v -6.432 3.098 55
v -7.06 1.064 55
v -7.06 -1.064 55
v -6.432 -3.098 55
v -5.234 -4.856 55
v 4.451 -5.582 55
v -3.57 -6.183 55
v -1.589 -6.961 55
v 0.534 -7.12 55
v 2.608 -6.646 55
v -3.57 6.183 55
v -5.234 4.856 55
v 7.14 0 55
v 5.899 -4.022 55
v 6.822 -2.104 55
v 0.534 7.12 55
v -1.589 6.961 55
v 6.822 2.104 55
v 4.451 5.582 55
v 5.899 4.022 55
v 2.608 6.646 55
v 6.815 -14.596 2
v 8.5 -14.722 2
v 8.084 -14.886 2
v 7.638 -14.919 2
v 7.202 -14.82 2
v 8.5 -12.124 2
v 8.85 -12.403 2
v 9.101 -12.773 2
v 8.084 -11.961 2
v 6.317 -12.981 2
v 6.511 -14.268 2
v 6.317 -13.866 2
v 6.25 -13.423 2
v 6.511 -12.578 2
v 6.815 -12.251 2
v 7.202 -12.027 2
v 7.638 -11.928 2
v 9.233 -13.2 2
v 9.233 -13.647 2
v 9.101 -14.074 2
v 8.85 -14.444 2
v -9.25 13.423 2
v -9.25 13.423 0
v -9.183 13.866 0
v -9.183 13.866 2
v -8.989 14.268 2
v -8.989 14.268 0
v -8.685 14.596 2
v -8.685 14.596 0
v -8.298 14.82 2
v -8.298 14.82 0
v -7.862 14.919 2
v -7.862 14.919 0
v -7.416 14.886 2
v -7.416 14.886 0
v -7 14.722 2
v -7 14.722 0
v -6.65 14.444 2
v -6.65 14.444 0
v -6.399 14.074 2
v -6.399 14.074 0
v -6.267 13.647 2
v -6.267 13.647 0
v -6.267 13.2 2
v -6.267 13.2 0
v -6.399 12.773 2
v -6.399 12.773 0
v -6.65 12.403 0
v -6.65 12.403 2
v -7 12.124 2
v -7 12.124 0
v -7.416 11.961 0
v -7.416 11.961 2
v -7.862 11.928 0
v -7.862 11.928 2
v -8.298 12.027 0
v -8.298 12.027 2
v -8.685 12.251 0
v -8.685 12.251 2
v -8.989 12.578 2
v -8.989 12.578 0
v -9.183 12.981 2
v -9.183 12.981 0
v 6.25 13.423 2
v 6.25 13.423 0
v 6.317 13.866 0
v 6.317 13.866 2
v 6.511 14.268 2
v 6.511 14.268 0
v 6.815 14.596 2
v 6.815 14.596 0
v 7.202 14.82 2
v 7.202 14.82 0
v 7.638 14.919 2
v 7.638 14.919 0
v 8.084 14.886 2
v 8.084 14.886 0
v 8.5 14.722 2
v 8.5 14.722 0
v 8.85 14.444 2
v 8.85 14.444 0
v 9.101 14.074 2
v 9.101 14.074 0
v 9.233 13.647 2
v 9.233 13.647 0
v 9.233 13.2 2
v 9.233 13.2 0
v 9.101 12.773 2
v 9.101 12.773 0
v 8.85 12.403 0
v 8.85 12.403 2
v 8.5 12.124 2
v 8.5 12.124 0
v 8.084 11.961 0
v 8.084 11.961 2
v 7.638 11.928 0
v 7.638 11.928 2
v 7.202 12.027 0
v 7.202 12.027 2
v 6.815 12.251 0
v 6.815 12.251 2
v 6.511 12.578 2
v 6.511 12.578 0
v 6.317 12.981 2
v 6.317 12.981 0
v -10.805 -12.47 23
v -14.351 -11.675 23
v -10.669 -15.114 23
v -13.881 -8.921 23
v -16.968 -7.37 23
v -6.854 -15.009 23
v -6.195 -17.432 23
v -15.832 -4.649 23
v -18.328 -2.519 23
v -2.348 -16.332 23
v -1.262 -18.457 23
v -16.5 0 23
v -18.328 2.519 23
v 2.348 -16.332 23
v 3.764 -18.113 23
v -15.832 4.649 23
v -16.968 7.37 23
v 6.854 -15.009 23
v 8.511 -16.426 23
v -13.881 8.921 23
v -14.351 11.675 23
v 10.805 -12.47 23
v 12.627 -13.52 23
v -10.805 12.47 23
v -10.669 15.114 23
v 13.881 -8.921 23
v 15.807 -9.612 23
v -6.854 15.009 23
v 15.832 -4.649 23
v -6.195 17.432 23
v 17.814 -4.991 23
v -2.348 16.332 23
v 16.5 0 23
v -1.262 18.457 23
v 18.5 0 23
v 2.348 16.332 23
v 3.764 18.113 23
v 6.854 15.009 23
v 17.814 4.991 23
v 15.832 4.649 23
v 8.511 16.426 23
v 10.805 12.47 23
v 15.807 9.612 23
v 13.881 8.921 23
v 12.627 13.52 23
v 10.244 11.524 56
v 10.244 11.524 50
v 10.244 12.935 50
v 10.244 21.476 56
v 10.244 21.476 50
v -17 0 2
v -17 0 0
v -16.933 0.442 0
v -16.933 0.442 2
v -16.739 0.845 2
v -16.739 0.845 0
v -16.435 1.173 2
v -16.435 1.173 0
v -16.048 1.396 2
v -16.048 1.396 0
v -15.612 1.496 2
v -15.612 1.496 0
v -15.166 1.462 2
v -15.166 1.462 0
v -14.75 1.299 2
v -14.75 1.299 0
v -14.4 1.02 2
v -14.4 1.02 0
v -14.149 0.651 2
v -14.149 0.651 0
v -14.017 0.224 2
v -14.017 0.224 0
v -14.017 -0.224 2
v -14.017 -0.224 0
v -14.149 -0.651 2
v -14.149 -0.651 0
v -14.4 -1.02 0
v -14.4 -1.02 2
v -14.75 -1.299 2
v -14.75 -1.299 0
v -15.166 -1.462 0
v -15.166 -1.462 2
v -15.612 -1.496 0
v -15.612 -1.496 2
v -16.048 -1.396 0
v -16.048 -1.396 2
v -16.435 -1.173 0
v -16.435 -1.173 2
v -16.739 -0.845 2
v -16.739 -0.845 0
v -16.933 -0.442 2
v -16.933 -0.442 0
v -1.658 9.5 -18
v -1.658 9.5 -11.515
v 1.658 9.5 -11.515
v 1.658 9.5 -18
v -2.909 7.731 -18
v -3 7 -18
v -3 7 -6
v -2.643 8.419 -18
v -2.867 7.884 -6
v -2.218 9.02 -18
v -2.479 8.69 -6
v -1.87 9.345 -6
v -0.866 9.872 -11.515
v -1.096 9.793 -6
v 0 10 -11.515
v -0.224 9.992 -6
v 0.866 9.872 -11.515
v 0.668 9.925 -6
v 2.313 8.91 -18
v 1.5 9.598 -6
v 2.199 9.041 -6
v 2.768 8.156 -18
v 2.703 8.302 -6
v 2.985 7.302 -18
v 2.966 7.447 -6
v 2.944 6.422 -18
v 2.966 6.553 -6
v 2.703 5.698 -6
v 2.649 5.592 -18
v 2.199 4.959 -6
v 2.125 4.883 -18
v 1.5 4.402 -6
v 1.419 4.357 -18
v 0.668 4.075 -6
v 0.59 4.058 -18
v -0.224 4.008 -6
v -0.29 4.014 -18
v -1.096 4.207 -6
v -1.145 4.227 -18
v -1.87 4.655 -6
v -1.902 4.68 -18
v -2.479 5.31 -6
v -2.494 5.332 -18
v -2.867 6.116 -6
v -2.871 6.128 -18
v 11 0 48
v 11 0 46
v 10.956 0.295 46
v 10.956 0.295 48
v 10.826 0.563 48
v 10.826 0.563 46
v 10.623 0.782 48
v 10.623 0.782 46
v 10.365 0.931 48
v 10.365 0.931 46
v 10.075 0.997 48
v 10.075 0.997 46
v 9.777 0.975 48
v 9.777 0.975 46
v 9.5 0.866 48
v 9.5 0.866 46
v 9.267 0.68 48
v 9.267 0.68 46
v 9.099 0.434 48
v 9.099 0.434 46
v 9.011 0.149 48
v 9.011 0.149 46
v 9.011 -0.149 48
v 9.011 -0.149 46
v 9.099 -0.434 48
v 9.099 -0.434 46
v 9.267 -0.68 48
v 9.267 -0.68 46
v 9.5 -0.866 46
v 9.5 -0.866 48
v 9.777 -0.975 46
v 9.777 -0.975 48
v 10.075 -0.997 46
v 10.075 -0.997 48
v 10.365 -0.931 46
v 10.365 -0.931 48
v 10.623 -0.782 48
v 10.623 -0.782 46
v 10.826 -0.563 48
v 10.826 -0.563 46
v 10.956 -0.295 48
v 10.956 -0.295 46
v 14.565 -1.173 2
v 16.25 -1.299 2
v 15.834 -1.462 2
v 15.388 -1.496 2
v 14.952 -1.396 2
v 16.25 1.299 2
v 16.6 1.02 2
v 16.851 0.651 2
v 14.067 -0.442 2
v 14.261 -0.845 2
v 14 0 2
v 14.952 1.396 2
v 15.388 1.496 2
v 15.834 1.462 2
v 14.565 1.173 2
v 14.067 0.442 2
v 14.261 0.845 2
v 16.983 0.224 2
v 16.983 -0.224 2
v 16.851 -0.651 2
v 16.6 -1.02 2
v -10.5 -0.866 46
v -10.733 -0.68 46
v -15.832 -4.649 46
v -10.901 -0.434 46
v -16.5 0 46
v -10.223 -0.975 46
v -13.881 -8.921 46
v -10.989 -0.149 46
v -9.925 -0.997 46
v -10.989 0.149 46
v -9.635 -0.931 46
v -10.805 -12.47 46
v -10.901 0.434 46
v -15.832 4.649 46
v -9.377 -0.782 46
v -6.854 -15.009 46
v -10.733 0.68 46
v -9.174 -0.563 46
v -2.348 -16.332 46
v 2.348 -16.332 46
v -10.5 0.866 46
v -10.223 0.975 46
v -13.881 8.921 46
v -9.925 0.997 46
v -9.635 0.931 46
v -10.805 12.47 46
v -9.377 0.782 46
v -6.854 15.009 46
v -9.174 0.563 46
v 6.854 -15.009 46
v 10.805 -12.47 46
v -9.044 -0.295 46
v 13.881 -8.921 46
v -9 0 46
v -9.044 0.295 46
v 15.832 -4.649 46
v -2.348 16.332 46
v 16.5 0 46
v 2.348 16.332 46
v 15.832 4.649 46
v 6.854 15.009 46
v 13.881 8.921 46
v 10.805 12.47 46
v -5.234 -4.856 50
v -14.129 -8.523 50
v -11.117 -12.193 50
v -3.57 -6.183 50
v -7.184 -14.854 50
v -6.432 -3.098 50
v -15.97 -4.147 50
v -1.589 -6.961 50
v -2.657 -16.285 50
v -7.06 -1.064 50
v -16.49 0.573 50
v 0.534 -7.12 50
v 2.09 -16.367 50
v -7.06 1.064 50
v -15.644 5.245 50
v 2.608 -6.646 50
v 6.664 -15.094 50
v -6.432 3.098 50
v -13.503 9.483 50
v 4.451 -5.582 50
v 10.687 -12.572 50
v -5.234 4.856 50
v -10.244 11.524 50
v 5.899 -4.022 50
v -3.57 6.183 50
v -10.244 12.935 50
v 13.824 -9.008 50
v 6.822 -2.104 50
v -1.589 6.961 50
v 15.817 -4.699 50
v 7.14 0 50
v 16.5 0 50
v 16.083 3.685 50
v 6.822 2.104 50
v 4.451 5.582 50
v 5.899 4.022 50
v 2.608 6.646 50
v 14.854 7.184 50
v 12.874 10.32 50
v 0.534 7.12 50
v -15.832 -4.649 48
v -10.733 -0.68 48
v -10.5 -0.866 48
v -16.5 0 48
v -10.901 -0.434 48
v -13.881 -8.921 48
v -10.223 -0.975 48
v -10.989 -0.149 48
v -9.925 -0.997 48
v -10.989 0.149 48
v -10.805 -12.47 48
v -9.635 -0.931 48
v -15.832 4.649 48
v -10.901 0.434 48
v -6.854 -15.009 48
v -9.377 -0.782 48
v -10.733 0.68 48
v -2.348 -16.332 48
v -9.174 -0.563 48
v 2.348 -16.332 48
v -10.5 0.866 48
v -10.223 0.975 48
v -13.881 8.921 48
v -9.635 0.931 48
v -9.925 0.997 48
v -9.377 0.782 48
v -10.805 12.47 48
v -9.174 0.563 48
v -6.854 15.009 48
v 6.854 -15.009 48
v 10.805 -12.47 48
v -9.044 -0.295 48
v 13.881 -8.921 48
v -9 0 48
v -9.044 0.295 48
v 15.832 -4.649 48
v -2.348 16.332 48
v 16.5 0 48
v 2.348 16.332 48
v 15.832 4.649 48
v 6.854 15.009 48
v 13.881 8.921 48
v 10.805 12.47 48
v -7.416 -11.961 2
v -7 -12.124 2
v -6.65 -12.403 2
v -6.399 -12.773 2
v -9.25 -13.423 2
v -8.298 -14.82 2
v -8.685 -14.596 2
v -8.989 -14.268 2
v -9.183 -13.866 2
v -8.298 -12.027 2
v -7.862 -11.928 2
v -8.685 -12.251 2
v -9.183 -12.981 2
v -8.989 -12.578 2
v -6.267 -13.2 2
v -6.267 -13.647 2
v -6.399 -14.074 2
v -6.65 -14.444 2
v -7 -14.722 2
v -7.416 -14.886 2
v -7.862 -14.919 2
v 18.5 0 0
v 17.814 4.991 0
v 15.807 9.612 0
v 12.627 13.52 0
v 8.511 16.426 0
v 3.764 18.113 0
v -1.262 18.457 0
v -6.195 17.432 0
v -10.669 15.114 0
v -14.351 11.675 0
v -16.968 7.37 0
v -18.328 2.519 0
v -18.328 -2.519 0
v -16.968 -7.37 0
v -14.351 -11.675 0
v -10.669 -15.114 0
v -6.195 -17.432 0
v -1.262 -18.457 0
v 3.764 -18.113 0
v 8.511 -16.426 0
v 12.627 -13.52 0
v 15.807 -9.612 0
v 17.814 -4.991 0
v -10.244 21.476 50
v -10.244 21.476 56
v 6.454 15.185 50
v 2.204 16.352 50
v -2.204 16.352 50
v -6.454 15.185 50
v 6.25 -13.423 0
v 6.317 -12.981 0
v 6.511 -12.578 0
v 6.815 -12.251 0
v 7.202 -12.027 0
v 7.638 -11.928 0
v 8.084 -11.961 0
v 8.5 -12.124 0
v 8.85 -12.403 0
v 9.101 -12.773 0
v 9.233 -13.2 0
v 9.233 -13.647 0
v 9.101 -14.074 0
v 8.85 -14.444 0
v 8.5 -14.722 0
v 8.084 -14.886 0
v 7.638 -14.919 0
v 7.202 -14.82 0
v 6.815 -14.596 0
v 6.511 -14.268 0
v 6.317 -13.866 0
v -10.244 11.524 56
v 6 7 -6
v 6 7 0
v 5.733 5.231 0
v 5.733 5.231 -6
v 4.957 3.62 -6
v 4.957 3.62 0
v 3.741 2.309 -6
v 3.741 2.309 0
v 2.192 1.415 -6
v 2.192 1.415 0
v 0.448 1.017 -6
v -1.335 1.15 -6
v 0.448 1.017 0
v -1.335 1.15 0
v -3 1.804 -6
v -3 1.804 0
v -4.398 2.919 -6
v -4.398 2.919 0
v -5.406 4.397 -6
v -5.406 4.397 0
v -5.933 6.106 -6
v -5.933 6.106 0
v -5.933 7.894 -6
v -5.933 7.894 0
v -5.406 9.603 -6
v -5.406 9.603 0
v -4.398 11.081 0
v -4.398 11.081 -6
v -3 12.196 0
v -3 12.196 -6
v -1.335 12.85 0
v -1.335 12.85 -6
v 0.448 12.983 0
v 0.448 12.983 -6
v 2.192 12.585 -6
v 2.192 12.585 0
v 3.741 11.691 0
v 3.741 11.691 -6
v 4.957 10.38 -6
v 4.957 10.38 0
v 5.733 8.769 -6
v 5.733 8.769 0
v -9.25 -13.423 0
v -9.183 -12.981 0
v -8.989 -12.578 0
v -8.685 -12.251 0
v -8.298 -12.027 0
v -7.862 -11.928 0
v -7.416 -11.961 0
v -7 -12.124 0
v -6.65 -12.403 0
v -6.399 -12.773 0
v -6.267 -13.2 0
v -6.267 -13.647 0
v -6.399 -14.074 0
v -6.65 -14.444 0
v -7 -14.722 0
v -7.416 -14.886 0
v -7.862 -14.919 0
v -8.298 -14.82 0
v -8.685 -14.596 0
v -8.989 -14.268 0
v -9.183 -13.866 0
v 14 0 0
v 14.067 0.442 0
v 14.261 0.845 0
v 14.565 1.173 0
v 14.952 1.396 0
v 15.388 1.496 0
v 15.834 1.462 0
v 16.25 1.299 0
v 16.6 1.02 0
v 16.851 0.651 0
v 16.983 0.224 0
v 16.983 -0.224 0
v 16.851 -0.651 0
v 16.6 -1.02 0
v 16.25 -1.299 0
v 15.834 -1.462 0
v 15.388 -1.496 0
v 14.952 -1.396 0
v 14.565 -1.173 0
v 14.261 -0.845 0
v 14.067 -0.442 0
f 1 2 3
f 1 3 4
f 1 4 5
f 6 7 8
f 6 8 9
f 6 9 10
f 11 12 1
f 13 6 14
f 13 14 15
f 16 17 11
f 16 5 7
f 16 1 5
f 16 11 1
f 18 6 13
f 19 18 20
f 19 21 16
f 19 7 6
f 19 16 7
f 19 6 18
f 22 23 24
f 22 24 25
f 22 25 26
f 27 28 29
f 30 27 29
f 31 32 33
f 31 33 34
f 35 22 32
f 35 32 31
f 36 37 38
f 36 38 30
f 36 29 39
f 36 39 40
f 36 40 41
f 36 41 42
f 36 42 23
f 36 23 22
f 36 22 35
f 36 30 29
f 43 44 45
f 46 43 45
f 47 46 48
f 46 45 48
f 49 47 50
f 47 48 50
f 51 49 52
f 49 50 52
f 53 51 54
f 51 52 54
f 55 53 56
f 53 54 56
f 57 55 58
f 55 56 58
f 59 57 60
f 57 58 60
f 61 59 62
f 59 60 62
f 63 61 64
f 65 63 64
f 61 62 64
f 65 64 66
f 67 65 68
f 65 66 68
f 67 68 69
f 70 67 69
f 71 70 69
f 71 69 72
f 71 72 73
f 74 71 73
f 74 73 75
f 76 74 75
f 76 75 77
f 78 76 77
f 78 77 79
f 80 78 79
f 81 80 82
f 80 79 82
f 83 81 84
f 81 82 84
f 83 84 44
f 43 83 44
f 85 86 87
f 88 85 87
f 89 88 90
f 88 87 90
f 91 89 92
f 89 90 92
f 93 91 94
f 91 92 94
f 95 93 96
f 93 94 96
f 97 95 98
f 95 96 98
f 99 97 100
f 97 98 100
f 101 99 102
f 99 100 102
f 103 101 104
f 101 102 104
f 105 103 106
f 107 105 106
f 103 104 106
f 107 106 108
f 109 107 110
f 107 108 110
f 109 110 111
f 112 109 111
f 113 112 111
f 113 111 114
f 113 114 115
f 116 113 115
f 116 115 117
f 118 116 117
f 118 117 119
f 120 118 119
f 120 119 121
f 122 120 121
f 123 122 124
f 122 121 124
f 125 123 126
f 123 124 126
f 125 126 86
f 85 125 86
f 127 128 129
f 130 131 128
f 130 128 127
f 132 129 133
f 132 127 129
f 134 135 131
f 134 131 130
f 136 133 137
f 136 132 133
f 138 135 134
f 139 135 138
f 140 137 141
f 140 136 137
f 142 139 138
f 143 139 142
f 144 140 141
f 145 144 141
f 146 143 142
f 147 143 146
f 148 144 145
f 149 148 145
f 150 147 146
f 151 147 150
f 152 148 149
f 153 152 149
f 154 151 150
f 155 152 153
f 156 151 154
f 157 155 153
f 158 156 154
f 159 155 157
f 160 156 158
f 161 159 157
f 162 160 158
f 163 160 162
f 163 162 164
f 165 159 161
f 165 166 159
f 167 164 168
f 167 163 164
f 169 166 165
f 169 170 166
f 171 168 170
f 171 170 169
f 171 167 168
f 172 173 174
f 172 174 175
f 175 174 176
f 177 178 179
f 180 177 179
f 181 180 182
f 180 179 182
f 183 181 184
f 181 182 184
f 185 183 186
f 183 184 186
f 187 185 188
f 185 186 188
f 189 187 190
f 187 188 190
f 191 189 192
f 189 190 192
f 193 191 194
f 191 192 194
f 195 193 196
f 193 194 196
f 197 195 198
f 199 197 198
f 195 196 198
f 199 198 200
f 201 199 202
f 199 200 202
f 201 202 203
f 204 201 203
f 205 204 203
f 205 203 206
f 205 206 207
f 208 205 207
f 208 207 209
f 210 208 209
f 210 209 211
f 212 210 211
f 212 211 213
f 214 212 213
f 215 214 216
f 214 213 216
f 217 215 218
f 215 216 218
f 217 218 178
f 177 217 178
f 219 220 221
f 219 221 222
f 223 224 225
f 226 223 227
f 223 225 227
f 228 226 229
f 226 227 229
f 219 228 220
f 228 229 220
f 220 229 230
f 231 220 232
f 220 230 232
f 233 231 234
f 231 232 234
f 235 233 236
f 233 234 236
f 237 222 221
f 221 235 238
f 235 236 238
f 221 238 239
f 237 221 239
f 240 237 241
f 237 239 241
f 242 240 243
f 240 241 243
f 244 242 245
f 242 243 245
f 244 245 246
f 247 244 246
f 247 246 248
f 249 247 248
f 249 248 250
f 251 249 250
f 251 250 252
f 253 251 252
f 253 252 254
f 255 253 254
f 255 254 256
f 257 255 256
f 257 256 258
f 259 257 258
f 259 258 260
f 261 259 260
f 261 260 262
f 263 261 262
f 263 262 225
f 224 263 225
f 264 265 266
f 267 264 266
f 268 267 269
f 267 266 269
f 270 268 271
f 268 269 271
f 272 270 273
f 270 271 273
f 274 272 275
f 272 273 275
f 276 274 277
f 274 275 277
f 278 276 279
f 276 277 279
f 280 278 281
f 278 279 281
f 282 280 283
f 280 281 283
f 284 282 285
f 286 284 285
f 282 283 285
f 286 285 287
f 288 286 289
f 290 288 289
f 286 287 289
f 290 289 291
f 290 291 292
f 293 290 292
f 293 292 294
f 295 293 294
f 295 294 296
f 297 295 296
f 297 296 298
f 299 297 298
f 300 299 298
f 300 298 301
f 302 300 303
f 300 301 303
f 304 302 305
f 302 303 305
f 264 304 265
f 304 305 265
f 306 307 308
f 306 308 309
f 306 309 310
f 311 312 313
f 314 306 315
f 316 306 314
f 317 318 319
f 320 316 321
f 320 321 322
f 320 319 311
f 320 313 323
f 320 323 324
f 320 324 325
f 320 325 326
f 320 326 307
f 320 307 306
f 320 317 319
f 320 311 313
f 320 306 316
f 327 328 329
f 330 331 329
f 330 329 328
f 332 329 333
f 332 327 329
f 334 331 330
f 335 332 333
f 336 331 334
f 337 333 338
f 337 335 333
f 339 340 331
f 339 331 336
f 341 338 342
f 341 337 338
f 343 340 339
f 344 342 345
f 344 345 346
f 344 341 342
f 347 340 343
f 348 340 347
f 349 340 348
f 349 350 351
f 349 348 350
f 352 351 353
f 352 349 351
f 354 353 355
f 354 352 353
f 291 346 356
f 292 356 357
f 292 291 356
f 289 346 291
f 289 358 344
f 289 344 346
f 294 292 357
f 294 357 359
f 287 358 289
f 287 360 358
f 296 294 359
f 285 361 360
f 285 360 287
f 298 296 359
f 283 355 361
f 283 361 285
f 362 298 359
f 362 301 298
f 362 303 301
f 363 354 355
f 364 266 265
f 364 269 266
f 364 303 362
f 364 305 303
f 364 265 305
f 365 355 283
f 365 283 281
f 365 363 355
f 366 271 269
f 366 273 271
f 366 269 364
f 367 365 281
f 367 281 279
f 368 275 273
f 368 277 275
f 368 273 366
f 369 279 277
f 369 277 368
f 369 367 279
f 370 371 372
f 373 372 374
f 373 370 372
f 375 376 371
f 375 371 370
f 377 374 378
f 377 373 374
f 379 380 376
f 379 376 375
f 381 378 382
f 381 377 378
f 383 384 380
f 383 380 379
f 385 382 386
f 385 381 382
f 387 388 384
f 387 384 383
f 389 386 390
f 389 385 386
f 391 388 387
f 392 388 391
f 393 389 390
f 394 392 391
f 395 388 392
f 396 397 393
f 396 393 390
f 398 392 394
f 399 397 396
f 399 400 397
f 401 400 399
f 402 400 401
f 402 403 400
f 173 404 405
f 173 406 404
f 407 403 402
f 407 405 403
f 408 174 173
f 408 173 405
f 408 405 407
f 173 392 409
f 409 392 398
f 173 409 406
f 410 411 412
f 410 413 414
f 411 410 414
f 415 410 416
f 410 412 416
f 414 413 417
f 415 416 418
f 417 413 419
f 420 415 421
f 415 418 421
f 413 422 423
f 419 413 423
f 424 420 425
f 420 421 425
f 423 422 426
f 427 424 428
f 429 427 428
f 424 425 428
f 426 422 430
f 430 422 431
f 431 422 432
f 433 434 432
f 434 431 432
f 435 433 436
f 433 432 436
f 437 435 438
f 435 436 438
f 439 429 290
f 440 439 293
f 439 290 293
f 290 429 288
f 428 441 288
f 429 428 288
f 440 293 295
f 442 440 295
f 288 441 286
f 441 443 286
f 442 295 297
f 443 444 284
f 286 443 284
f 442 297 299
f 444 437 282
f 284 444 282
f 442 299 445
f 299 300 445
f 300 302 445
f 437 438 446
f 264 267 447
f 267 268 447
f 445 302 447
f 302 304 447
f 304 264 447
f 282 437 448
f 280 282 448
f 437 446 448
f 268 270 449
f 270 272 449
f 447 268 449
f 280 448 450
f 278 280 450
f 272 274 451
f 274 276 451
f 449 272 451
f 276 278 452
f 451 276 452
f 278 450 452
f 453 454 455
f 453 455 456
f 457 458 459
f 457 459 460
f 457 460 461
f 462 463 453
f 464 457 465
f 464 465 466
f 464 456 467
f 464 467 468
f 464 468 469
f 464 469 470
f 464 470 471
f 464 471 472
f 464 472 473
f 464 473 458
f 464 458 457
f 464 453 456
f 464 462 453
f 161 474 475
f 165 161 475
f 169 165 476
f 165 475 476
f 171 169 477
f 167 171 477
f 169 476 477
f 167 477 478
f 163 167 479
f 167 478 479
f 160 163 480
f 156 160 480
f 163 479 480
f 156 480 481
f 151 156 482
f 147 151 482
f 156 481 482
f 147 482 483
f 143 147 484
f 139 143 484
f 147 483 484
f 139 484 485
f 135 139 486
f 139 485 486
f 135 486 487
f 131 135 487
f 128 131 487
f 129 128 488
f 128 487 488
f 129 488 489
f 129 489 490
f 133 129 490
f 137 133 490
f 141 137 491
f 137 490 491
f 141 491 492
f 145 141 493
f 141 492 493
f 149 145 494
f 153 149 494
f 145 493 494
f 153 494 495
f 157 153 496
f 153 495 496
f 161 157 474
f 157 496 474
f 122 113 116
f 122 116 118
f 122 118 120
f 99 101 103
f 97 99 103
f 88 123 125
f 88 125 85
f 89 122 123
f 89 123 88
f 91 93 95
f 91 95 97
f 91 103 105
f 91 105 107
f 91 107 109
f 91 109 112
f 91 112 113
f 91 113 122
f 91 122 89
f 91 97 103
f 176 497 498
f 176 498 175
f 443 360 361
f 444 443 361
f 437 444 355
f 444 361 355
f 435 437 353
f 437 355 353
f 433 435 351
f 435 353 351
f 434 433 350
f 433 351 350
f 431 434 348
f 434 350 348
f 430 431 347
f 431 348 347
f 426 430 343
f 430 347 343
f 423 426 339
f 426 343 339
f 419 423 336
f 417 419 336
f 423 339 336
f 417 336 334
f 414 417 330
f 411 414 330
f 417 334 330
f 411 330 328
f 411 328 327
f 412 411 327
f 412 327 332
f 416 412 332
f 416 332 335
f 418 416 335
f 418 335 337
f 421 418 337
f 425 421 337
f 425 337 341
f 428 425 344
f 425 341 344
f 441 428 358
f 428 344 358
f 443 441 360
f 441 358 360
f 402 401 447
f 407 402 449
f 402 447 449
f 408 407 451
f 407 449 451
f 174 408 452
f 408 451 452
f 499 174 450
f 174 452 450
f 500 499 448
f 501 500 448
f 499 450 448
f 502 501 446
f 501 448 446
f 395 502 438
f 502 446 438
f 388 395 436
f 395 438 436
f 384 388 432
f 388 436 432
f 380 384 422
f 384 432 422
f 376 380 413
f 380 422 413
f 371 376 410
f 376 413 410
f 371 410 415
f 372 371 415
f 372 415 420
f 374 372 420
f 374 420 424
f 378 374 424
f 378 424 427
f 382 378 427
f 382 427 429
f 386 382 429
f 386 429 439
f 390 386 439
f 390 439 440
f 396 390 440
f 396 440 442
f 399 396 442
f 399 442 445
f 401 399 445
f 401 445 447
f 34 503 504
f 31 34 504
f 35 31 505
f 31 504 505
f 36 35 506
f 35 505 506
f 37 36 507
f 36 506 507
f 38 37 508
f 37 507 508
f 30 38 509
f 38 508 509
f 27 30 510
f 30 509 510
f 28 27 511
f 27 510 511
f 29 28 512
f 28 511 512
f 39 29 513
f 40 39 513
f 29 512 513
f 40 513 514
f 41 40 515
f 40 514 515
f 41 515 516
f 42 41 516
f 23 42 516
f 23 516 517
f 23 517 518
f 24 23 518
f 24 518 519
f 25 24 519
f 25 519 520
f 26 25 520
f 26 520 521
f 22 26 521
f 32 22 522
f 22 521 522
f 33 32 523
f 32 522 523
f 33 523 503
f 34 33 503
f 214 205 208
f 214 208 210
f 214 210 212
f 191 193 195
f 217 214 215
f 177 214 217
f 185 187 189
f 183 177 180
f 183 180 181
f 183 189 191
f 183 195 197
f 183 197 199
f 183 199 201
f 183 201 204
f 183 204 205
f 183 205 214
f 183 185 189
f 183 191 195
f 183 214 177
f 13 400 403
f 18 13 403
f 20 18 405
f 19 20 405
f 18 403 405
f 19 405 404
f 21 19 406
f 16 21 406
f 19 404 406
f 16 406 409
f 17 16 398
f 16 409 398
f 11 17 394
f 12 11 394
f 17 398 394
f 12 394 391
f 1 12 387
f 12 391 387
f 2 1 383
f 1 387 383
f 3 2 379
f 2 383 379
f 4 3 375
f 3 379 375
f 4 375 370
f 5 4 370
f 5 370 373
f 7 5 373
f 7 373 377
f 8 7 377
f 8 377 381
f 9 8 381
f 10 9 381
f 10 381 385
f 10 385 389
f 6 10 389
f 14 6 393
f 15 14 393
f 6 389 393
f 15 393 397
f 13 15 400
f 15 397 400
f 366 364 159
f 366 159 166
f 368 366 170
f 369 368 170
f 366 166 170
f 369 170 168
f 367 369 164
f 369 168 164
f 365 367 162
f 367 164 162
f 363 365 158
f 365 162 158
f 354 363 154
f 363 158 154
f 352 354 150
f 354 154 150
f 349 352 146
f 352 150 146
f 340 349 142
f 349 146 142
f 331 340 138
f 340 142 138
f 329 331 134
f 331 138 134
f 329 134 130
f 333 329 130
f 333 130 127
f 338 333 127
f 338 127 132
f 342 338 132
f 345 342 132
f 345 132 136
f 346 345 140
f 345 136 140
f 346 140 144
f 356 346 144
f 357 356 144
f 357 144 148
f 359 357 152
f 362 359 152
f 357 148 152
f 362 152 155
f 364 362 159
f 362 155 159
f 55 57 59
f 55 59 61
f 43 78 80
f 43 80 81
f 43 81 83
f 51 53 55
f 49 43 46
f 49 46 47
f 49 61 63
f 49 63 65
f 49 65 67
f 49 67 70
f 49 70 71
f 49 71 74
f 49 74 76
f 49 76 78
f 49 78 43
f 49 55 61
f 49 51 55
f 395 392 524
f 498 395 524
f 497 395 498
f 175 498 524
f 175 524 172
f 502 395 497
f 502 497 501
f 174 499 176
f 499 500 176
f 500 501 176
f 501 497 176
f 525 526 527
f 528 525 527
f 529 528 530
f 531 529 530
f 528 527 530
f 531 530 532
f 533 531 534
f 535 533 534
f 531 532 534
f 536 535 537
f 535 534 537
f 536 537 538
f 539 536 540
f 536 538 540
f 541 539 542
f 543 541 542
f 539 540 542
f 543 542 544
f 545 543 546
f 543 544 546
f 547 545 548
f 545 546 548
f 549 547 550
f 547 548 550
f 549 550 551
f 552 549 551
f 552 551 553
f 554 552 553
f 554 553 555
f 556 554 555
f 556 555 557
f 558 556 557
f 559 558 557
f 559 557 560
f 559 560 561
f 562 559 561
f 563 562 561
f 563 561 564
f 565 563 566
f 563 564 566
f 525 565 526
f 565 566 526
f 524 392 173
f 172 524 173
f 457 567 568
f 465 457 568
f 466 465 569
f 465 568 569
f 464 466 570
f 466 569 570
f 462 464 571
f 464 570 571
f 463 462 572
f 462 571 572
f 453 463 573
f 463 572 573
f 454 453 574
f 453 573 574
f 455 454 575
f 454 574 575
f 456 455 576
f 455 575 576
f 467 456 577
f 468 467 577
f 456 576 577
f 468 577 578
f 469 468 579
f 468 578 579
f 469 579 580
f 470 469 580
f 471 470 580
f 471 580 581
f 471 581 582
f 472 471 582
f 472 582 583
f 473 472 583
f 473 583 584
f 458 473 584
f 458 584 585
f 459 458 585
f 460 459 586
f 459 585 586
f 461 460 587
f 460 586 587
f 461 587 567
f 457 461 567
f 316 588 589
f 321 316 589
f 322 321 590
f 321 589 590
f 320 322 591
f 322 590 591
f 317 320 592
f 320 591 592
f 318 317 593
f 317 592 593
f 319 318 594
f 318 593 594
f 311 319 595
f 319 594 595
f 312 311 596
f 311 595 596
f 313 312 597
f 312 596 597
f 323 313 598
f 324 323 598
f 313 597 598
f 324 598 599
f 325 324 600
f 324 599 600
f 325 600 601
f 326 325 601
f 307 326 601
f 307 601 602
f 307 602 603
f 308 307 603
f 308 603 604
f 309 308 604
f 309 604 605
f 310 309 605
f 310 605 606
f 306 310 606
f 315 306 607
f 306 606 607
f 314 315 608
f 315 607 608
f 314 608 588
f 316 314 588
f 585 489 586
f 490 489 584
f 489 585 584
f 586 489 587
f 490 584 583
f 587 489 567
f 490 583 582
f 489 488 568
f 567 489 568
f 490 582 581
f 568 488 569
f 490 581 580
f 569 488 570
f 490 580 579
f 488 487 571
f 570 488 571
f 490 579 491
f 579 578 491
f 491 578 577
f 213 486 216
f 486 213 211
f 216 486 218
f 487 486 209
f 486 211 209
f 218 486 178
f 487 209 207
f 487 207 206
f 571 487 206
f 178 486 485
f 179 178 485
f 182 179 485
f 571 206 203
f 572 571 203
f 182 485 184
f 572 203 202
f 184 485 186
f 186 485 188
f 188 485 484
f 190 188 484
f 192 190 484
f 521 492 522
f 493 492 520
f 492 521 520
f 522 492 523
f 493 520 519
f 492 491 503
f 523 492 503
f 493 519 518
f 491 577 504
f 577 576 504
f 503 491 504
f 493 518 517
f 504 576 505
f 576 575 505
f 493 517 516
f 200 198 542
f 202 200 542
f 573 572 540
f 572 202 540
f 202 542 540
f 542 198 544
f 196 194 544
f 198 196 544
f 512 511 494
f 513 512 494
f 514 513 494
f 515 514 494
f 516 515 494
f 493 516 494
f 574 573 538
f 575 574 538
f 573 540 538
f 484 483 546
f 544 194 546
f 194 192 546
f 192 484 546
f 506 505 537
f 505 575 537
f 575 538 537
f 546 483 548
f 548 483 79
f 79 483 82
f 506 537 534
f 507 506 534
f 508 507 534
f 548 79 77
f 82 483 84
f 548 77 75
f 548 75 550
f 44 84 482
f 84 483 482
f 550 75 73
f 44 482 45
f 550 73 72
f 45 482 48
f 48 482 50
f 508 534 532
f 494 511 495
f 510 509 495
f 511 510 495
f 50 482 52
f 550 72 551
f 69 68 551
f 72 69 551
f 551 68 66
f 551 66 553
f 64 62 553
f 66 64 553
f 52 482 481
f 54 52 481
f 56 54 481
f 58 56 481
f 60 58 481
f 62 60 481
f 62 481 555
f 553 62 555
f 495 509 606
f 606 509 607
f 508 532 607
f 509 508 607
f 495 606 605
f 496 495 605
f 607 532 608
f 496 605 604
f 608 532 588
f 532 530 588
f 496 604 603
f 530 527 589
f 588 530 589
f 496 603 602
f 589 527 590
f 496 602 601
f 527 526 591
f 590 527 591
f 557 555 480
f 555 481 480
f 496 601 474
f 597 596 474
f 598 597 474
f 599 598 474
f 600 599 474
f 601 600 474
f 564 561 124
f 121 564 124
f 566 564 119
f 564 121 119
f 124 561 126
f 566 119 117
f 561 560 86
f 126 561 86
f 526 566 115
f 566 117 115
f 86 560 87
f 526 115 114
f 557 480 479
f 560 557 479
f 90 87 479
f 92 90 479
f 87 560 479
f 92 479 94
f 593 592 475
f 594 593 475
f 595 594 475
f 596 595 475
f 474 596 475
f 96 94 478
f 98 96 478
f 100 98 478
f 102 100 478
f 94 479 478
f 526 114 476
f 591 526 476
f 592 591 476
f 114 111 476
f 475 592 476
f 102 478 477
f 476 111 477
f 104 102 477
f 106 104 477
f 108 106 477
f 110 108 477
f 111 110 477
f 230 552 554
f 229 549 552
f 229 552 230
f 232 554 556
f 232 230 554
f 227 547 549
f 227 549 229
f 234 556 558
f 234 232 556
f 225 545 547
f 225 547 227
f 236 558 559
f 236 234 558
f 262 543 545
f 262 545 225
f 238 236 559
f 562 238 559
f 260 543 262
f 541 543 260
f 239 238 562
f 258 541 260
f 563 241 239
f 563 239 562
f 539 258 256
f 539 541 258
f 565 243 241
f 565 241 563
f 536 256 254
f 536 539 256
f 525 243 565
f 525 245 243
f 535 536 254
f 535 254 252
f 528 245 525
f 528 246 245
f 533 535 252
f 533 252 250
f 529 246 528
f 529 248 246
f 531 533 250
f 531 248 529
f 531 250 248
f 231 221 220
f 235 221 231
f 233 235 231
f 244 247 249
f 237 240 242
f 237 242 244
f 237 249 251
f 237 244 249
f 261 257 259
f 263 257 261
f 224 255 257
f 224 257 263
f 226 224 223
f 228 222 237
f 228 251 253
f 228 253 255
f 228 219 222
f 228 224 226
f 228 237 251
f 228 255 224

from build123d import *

# Parameters (mm, degrees)
SKETCH_1_R               = 18.5
EXTRUDE_1_DEPTH          = 23
SKETCH_2_R               = 16.5
EXTRUDE_2_DEPTH          = 23
SKETCH_3_R               = 6
EXTRUDE_3_DEPTH          = 6
SKETCH_4_R               = 3
EXTRUDE_4_DEPTH          = 12
CUT_EXTRUDE_1_DEPTH      = 53.919750566
CUT_EXTRUDE_1_DEPTH_BACK = 53.919750566
SKETCH_5_W               = 8.515862451
SKETCH_5_H               = 10.43869594
SKETCH_6_R               = 1
EXTRUDE_5_DEPTH          = 2
SKETCH_7_R               = 16.5
EXTRUDE_6_DEPTH          = 2
SKETCH_8_R               = 7.139531777
EXTRUDE_7_DEPTH          = 5
SKETCH_9_W               = 20.48733328
SKETCH_9_H               = 9.95175006
EXTRUDE_8_DEPTH          = 6
SKETCH_10_R              = 1.5
CUT_EXTRUDE_2_DEPTH      = 2


with BuildPart() as part:
    # 草图1 → 凸台-拉伸1 (new body)
    with BuildSketch(Plane.XY):
        Circle(SKETCH_1_R)
    extrude(amount=EXTRUDE_1_DEPTH)

    # 草图2 → 凸台-拉伸2 (add)
    with BuildSketch(Plane.XY.offset(23)):
        Circle(SKETCH_2_R)
    extrude(amount=EXTRUDE_2_DEPTH)

    # 草图3 → 凸台-拉伸3 (add)
    with BuildSketch(Plane(origin=(0, 0, 0), x_dir=(-1, 0, 0), z_dir=(0, 0, -1))):
        with Locations(Location((0, 7, 0), (0, 0, 180))):
            Circle(SKETCH_3_R)
    extrude(amount=EXTRUDE_3_DEPTH)

    # 草图4 → 凸台-拉伸4 (add)
    with BuildSketch(Plane(origin=(0, 0, -6), x_dir=(-1, 0, 0), z_dir=(0, 0, -1))):
        with Locations((0, 7)):
            Circle(SKETCH_4_R)
    extrude(amount=EXTRUDE_4_DEPTH)

    # 草图5 → 切除-拉伸1 (cut, two sides: drawn at the far end of the back side and taken through both)
    with BuildSketch(Plane(origin=(0, 0, 0), x_dir=(0, 0, -1), z_dir=(1, 0, 0)).offset(-CUT_EXTRUDE_1_DEPTH_BACK)):
        with Locations((15.772473003, 14.71934797)):
            Rectangle(SKETCH_5_W, SKETCH_5_H)
    extrude(amount=CUT_EXTRUDE_1_DEPTH + CUT_EXTRUDE_1_DEPTH_BACK, mode=Mode.SUBTRACT)

    # 草图6 → 凸台-拉伸5 (add)
    with BuildSketch(Plane.XY.offset(46)):
        with Locations((-10, 0)):
            Circle(SKETCH_6_R)
        with Locations((10, 0)):
            Circle(SKETCH_6_R)
    extrude(amount=EXTRUDE_5_DEPTH)

    # 草图7 → 凸台-拉伸6 (add)
    with BuildSketch(Plane.XY.offset(48)):
        Circle(SKETCH_7_R)
    extrude(amount=EXTRUDE_6_DEPTH)

    # 草图8 → 凸台-拉伸7 (add)
    with BuildSketch(Plane.XY.offset(50)):
        Circle(SKETCH_8_R)
    extrude(amount=EXTRUDE_7_DEPTH)

    # 草图9 → 凸台-拉伸8 (add)
    with BuildSketch(Plane.XY.offset(50)):
        with Locations((0, 16.5)):
            Rectangle(SKETCH_9_W, SKETCH_9_H)
    extrude(amount=EXTRUDE_8_DEPTH)

    # 草图10 → 切除-拉伸2 (cut)
    with BuildSketch(Plane(origin=(0, 0, 0), x_dir=(-1, 0, 0), z_dir=(0, 0, -1))):
        with Locations((15.5, 0)):
            Circle(SKETCH_10_R)
        with Locations((7.75, -13.423393759)):
            Circle(SKETCH_10_R)
        with Locations((-7.75, -13.423393759)):
            Circle(SKETCH_10_R)
        with Locations((-15.5, 0)):
            Circle(SKETCH_10_R)
        with Locations((-7.75, 13.423393759)):
            Circle(SKETCH_10_R)
        with Locations((7.75, 13.423393759)):
            Circle(SKETCH_10_R)
    extrude(amount=-CUT_EXTRUDE_2_DEPTH, mode=Mode.SUBTRACT)


solid = part.part
